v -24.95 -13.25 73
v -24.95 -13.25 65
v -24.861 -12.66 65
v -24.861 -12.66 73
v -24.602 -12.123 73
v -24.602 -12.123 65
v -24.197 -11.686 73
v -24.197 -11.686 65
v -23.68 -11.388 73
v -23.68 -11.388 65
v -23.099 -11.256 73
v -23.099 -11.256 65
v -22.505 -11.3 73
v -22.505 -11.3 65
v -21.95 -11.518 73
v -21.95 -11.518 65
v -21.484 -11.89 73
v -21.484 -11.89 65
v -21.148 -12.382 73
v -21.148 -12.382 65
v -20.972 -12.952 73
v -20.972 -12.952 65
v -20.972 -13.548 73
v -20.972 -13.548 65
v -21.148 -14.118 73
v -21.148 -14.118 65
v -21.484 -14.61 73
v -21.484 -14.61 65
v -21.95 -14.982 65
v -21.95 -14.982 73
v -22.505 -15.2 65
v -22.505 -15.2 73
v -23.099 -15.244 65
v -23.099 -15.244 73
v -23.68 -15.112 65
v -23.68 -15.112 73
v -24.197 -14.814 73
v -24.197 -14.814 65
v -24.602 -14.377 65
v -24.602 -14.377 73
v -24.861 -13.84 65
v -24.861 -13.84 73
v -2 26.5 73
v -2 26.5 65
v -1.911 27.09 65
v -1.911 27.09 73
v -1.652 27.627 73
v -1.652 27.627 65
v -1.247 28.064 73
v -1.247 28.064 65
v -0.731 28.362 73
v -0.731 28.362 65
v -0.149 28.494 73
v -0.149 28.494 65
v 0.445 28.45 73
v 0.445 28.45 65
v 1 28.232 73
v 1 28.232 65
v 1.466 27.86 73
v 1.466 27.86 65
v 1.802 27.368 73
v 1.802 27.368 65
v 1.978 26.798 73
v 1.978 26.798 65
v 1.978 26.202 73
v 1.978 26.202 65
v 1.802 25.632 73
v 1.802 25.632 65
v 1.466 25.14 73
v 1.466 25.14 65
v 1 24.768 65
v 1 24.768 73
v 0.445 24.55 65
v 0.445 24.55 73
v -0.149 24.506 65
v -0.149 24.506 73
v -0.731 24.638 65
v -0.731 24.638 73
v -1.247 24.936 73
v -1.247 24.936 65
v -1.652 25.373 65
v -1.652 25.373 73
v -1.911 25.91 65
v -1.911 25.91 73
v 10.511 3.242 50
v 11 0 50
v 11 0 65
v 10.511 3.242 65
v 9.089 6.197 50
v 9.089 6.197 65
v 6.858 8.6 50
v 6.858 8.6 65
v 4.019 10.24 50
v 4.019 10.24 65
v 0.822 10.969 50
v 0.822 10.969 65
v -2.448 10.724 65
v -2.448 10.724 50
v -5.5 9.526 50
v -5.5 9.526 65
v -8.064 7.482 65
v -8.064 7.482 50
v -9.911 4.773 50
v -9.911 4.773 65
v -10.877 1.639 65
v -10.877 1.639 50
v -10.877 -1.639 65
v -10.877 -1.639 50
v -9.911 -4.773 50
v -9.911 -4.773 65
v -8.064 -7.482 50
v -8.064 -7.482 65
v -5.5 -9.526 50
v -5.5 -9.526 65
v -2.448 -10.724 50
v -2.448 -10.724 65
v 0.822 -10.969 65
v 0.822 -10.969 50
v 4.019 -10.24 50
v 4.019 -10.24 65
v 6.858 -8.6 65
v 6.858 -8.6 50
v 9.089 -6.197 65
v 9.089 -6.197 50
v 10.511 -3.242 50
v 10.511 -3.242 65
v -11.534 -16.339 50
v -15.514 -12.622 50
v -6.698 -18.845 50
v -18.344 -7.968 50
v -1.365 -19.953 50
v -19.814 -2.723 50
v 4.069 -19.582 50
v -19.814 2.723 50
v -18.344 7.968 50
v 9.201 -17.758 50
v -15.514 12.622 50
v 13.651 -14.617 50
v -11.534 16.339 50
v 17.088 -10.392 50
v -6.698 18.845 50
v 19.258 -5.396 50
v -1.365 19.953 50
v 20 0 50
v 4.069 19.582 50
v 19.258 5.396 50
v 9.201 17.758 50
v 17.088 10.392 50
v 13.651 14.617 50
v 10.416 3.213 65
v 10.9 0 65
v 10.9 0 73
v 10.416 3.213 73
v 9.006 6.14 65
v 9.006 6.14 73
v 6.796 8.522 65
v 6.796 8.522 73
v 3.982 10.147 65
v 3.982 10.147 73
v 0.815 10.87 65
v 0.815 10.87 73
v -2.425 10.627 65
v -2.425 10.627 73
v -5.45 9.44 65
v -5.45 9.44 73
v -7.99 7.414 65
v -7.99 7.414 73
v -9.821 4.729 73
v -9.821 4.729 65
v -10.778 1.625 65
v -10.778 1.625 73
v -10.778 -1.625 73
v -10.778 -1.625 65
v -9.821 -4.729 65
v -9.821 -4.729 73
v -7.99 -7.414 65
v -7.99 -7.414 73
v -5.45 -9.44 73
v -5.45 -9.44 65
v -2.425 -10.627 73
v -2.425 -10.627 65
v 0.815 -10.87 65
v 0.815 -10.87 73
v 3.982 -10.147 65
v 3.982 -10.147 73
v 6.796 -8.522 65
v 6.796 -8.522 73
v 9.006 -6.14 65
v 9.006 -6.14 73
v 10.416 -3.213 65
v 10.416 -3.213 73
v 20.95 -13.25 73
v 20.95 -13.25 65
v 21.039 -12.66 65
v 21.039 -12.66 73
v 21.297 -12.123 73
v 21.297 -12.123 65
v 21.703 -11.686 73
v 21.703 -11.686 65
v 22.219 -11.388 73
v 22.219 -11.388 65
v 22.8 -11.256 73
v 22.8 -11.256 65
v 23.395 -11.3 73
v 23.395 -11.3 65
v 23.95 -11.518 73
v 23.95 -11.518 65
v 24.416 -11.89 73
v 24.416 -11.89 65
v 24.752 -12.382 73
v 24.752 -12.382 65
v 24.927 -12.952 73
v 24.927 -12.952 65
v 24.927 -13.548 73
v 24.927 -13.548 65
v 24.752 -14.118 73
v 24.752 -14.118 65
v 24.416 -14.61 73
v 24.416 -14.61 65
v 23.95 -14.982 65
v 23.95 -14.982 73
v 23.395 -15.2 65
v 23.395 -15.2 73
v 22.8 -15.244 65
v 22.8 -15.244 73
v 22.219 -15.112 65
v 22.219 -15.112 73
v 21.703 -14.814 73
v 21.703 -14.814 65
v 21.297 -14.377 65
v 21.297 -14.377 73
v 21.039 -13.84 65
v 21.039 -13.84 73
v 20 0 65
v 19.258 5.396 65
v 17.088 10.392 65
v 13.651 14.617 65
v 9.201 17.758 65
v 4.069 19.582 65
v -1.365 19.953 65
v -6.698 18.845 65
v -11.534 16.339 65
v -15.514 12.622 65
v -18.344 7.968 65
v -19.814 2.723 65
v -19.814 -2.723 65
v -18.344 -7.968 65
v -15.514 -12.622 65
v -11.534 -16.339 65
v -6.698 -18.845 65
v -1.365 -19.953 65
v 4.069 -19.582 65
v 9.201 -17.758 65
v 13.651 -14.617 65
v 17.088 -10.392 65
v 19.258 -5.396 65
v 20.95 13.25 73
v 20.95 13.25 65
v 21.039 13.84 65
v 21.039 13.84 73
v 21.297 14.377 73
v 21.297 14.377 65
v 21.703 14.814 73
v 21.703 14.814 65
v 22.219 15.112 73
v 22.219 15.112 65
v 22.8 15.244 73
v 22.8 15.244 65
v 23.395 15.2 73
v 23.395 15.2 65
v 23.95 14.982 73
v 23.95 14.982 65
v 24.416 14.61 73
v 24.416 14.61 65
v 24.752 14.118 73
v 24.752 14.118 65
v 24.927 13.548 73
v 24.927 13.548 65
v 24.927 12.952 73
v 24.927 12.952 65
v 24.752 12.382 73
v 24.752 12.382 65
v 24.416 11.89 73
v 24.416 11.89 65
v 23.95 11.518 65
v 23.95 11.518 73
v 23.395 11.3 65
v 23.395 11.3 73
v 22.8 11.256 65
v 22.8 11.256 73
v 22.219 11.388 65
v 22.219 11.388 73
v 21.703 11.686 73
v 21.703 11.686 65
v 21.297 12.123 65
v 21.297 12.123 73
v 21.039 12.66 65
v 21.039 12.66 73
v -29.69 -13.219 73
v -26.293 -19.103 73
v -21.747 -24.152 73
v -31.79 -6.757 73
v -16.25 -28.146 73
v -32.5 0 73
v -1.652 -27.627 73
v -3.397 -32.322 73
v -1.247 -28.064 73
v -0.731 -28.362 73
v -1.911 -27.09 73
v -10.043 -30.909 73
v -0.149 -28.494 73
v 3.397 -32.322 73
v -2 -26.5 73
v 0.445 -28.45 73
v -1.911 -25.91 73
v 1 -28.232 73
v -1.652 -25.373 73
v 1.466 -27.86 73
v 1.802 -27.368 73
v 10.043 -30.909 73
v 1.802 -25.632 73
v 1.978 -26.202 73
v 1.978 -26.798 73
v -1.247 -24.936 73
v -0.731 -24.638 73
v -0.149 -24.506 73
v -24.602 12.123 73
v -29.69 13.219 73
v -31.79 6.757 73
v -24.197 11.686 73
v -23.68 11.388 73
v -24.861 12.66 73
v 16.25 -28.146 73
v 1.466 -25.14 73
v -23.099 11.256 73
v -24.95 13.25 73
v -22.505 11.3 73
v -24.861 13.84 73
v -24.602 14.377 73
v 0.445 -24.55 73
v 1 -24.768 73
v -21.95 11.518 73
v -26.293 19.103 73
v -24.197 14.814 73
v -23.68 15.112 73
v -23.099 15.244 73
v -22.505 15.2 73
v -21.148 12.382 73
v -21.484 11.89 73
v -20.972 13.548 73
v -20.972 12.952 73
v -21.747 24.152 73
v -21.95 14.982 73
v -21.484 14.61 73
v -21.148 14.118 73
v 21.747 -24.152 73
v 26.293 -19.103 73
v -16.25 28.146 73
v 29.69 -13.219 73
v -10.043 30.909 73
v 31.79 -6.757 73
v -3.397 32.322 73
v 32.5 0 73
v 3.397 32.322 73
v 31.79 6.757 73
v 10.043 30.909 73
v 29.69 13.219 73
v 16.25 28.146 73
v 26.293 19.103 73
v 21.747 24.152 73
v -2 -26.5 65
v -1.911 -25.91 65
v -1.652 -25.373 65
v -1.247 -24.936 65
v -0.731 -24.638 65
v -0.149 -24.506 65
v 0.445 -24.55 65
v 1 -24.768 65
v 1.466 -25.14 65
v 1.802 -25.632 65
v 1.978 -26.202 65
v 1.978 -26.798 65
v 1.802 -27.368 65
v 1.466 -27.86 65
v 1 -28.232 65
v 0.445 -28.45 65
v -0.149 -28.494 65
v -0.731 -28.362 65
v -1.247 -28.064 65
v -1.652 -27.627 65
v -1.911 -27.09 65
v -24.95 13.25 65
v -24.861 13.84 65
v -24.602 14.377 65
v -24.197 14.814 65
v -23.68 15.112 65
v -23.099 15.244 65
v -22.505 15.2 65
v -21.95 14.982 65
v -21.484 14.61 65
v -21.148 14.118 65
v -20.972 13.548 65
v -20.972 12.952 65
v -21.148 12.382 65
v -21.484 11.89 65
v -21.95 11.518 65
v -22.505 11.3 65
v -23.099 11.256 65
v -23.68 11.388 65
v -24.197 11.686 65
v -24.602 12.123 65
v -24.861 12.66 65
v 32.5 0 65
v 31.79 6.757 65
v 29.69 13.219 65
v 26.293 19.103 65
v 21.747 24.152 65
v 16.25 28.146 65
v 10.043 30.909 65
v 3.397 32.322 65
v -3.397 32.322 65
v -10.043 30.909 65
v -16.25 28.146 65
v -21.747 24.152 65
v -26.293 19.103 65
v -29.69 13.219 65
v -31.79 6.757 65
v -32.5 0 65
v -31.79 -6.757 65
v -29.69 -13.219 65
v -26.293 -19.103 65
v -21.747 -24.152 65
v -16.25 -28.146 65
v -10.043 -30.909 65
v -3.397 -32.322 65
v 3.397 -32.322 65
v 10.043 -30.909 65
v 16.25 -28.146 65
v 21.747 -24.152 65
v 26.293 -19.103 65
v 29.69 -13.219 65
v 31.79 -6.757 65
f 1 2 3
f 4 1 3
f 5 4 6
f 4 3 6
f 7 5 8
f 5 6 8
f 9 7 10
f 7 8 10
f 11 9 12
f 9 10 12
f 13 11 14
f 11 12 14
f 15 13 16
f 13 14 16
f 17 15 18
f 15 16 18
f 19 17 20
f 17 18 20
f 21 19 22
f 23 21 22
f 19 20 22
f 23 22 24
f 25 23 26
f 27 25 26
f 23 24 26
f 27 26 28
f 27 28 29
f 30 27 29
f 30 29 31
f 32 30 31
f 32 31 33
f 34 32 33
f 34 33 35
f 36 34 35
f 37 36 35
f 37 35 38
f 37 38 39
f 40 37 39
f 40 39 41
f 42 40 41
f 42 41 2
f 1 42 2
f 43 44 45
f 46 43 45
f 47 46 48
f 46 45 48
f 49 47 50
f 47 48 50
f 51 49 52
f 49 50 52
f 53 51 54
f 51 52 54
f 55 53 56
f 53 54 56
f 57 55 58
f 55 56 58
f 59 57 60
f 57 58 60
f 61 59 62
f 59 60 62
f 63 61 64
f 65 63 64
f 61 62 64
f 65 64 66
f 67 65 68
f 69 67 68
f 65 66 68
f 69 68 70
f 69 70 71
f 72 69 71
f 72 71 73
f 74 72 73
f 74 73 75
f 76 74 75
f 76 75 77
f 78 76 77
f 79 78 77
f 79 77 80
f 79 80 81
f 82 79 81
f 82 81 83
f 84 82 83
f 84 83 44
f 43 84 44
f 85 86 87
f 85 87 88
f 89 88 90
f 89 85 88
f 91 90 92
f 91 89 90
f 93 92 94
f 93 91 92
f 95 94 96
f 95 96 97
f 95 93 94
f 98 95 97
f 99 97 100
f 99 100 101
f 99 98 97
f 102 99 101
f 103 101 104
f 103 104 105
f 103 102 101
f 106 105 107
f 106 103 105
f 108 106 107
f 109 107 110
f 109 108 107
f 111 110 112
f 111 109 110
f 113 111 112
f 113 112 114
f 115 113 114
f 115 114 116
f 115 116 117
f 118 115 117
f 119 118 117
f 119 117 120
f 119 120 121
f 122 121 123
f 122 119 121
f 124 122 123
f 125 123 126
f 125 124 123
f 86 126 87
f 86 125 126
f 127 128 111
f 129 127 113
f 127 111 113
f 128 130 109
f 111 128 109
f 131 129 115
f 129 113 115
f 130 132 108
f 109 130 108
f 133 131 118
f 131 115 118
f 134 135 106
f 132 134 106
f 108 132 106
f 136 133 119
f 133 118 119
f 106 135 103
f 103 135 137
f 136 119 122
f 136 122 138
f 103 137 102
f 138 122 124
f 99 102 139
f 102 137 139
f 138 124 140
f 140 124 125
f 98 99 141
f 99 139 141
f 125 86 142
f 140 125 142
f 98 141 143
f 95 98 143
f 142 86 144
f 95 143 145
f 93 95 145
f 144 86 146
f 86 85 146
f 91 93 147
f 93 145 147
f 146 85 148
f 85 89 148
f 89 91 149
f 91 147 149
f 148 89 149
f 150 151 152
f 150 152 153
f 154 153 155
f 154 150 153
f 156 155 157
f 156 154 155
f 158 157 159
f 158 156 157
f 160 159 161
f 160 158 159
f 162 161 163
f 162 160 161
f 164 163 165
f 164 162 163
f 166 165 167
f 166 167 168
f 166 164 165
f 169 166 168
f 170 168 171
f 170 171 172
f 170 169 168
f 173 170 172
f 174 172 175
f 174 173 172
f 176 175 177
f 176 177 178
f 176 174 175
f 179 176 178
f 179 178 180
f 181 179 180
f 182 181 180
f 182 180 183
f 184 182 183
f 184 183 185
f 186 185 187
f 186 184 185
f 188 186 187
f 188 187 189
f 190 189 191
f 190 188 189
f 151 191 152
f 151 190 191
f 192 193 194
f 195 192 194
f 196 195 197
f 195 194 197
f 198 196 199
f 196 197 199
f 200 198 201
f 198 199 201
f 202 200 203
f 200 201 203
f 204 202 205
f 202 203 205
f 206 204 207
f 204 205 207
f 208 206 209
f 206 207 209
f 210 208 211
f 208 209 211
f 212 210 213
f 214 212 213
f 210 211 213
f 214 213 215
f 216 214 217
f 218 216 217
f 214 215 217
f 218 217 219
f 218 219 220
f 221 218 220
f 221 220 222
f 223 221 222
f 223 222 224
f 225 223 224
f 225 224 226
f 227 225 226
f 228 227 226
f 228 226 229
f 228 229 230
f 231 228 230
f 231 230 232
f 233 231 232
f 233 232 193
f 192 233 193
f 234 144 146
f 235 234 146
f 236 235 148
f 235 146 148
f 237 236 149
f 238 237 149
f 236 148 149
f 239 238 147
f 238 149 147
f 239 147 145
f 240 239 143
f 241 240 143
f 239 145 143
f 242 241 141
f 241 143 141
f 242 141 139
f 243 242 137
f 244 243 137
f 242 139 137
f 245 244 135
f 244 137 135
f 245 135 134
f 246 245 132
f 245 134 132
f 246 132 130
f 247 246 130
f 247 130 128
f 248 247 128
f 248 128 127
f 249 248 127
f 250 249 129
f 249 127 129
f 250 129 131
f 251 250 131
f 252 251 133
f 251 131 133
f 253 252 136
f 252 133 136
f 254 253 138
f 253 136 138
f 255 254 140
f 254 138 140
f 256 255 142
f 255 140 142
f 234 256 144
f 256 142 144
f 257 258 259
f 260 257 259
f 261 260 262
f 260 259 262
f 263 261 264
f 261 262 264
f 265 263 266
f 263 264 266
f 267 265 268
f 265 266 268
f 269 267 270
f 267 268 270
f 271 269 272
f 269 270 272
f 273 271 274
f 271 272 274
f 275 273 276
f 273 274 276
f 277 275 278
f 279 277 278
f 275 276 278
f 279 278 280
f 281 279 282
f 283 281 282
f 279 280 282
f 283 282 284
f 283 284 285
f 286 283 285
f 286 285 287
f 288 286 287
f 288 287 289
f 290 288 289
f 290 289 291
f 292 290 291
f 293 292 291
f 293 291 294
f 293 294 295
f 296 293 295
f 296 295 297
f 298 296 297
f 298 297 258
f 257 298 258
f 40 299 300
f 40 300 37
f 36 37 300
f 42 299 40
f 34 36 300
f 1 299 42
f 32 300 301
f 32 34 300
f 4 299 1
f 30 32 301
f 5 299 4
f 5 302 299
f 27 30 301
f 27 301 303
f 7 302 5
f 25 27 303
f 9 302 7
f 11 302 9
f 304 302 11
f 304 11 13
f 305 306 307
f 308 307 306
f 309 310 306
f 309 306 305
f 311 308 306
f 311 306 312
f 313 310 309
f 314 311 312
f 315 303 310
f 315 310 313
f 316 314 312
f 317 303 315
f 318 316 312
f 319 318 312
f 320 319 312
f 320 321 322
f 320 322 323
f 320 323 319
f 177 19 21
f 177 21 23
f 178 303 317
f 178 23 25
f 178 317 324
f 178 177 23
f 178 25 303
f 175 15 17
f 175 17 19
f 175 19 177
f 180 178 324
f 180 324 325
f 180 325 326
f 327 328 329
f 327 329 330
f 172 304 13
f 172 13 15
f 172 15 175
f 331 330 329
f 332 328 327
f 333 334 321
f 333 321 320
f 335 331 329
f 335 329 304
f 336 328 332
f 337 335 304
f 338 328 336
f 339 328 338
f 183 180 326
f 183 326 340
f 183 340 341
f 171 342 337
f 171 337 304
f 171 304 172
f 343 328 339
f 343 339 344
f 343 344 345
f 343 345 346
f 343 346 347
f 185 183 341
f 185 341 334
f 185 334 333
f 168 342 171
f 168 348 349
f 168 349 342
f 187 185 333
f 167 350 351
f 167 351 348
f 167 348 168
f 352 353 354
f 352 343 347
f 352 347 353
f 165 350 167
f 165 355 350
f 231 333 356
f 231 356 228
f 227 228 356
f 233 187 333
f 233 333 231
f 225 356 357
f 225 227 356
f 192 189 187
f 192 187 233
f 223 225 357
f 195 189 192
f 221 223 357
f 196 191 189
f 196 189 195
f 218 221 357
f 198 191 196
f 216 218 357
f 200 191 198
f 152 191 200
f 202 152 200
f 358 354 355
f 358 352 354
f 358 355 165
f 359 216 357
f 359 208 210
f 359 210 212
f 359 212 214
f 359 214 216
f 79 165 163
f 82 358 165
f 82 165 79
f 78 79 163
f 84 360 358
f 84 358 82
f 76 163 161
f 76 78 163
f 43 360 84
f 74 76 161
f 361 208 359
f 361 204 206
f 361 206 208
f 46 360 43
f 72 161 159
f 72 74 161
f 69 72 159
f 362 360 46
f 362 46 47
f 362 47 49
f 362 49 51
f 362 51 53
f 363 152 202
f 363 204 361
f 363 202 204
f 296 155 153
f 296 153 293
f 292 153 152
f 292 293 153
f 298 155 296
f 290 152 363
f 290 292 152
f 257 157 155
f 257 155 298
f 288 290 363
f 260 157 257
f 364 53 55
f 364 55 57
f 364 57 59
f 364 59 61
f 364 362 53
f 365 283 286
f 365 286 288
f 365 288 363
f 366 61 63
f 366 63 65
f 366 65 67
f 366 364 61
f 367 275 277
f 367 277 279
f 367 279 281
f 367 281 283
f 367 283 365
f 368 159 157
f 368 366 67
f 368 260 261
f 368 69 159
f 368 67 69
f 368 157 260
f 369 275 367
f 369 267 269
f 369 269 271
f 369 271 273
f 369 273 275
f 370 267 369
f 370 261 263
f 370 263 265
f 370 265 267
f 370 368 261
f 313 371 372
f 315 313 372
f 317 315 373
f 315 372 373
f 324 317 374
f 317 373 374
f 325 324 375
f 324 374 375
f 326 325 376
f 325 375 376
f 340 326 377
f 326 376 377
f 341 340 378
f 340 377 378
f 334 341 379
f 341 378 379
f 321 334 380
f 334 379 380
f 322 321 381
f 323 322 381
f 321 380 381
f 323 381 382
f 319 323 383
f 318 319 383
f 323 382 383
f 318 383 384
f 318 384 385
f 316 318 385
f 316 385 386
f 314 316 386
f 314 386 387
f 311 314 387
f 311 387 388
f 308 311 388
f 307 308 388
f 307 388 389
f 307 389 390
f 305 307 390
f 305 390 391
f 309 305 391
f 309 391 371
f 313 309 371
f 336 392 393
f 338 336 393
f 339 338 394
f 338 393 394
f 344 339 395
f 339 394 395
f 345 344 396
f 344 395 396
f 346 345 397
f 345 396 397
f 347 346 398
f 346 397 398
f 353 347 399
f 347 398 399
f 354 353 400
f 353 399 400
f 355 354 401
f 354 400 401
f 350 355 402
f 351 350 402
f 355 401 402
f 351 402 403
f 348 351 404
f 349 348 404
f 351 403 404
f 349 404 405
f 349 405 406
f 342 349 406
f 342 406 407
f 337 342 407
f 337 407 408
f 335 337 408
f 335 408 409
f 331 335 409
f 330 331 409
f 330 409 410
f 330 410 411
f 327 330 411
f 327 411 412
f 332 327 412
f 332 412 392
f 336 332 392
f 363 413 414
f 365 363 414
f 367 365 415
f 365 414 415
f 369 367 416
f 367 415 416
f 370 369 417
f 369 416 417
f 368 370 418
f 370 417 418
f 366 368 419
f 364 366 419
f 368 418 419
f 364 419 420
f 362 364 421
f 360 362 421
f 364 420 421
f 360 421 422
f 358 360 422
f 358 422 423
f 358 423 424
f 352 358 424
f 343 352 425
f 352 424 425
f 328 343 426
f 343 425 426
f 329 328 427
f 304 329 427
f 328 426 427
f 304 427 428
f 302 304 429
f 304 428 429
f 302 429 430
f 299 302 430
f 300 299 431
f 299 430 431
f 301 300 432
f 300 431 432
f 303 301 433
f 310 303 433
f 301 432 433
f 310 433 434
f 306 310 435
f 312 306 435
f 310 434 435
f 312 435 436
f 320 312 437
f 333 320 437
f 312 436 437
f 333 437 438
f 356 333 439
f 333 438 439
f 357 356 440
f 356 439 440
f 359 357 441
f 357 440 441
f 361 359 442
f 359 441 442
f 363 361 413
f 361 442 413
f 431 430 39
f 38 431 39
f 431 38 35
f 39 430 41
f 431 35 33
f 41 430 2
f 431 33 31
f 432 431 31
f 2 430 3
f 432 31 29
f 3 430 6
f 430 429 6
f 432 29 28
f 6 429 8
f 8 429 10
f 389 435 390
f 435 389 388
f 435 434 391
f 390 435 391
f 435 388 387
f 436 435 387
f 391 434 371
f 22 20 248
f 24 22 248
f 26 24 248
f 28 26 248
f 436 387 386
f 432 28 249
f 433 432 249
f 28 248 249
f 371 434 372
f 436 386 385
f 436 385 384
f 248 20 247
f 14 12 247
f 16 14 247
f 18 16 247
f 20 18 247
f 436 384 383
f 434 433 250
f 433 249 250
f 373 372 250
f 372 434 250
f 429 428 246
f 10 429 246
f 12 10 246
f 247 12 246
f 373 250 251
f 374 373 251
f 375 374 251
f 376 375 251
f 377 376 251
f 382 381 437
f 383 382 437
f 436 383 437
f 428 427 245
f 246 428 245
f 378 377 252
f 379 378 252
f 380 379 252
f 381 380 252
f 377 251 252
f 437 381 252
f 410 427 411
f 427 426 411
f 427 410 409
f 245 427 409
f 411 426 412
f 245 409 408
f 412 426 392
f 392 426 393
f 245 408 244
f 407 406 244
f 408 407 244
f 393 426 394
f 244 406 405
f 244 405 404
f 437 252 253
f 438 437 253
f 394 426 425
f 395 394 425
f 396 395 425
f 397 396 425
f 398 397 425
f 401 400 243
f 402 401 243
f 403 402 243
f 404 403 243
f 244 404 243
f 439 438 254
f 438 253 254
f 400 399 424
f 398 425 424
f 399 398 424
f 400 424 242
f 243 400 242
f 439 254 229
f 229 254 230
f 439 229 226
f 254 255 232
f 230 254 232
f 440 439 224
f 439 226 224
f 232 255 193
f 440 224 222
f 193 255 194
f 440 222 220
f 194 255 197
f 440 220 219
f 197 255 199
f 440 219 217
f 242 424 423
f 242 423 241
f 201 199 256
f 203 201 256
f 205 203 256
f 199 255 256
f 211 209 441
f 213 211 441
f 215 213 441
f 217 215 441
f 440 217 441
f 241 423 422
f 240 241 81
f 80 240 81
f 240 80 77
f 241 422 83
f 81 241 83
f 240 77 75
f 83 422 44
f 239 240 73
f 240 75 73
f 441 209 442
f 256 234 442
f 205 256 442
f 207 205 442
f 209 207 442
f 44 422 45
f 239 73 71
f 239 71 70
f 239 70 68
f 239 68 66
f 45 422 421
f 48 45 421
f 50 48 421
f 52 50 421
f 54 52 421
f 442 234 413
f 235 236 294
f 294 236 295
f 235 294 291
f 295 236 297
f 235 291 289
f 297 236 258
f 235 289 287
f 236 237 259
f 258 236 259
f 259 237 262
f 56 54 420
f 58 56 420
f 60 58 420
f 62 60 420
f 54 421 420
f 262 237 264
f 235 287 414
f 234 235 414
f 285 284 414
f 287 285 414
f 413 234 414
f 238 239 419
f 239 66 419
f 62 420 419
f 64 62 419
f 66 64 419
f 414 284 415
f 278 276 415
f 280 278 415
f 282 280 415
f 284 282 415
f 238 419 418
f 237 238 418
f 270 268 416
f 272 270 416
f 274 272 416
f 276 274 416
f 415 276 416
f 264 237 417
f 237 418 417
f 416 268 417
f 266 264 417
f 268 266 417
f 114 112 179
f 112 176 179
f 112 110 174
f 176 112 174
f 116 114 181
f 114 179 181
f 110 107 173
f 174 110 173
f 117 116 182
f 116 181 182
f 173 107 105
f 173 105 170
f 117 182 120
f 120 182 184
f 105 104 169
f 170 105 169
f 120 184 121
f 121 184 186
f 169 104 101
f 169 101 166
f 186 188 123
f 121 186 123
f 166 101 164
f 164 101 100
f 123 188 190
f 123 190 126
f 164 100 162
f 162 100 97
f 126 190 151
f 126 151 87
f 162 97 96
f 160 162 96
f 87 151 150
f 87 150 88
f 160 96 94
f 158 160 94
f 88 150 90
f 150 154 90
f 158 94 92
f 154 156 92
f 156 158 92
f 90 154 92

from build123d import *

# Parameters (mm, degrees)
EXTRUDE_START       = 50
SKETCH_1_R          = 20
SKETCH_1_R_2        = 11
EXTRUDE_1_DEPTH     = 15
SKETCH_2_R          = 32.5
SKETCH_2_R_2        = 10.9
EXTRUDE_2_DEPTH     = 8
SKETCH_3_R          = 2
CUT_EXTRUDE_3_DEPTH = 49.347699015


with BuildPart() as part:
    # Эскиз1 → Вытянуть1 (new body)
    with BuildSketch(Plane.XY.offset(EXTRUDE_START)):
        Circle(SKETCH_1_R)
        Circle(SKETCH_1_R_2, mode=Mode.SUBTRACT)
    extrude(amount=EXTRUDE_1_DEPTH)

    # Эскиз2 → Вытянуть2 (add)
    with BuildSketch(Plane.XY.offset(65)):
        Circle(SKETCH_2_R)
        Circle(SKETCH_2_R_2, mode=Mode.SUBTRACT)
    extrude(amount=EXTRUDE_2_DEPTH)

    # Эскиз3 → Вытянуть3 (cut, through all)
    with BuildSketch(Plane(origin=(0, 0, 65), x_dir=(-1, 0, 0), z_dir=(0, 0, -1))):
        with Locations((0, 26.5)):
            Circle(SKETCH_3_R)
        with Locations((22.9496732, 13.25)):
            Circle(SKETCH_3_R)
        with Locations((22.9496732, -13.25)):
            Circle(SKETCH_3_R)
        with Locations((0, -26.5)):
            Circle(SKETCH_3_R)
        with Locations((-22.9496732, -13.25)):
            Circle(SKETCH_3_R)
        with Locations((-22.9496732, 13.25)):
            Circle(SKETCH_3_R)
    extrude(amount=-CUT_EXTRUDE_3_DEPTH, mode=Mode.SUBTRACT)


solid = part.part
